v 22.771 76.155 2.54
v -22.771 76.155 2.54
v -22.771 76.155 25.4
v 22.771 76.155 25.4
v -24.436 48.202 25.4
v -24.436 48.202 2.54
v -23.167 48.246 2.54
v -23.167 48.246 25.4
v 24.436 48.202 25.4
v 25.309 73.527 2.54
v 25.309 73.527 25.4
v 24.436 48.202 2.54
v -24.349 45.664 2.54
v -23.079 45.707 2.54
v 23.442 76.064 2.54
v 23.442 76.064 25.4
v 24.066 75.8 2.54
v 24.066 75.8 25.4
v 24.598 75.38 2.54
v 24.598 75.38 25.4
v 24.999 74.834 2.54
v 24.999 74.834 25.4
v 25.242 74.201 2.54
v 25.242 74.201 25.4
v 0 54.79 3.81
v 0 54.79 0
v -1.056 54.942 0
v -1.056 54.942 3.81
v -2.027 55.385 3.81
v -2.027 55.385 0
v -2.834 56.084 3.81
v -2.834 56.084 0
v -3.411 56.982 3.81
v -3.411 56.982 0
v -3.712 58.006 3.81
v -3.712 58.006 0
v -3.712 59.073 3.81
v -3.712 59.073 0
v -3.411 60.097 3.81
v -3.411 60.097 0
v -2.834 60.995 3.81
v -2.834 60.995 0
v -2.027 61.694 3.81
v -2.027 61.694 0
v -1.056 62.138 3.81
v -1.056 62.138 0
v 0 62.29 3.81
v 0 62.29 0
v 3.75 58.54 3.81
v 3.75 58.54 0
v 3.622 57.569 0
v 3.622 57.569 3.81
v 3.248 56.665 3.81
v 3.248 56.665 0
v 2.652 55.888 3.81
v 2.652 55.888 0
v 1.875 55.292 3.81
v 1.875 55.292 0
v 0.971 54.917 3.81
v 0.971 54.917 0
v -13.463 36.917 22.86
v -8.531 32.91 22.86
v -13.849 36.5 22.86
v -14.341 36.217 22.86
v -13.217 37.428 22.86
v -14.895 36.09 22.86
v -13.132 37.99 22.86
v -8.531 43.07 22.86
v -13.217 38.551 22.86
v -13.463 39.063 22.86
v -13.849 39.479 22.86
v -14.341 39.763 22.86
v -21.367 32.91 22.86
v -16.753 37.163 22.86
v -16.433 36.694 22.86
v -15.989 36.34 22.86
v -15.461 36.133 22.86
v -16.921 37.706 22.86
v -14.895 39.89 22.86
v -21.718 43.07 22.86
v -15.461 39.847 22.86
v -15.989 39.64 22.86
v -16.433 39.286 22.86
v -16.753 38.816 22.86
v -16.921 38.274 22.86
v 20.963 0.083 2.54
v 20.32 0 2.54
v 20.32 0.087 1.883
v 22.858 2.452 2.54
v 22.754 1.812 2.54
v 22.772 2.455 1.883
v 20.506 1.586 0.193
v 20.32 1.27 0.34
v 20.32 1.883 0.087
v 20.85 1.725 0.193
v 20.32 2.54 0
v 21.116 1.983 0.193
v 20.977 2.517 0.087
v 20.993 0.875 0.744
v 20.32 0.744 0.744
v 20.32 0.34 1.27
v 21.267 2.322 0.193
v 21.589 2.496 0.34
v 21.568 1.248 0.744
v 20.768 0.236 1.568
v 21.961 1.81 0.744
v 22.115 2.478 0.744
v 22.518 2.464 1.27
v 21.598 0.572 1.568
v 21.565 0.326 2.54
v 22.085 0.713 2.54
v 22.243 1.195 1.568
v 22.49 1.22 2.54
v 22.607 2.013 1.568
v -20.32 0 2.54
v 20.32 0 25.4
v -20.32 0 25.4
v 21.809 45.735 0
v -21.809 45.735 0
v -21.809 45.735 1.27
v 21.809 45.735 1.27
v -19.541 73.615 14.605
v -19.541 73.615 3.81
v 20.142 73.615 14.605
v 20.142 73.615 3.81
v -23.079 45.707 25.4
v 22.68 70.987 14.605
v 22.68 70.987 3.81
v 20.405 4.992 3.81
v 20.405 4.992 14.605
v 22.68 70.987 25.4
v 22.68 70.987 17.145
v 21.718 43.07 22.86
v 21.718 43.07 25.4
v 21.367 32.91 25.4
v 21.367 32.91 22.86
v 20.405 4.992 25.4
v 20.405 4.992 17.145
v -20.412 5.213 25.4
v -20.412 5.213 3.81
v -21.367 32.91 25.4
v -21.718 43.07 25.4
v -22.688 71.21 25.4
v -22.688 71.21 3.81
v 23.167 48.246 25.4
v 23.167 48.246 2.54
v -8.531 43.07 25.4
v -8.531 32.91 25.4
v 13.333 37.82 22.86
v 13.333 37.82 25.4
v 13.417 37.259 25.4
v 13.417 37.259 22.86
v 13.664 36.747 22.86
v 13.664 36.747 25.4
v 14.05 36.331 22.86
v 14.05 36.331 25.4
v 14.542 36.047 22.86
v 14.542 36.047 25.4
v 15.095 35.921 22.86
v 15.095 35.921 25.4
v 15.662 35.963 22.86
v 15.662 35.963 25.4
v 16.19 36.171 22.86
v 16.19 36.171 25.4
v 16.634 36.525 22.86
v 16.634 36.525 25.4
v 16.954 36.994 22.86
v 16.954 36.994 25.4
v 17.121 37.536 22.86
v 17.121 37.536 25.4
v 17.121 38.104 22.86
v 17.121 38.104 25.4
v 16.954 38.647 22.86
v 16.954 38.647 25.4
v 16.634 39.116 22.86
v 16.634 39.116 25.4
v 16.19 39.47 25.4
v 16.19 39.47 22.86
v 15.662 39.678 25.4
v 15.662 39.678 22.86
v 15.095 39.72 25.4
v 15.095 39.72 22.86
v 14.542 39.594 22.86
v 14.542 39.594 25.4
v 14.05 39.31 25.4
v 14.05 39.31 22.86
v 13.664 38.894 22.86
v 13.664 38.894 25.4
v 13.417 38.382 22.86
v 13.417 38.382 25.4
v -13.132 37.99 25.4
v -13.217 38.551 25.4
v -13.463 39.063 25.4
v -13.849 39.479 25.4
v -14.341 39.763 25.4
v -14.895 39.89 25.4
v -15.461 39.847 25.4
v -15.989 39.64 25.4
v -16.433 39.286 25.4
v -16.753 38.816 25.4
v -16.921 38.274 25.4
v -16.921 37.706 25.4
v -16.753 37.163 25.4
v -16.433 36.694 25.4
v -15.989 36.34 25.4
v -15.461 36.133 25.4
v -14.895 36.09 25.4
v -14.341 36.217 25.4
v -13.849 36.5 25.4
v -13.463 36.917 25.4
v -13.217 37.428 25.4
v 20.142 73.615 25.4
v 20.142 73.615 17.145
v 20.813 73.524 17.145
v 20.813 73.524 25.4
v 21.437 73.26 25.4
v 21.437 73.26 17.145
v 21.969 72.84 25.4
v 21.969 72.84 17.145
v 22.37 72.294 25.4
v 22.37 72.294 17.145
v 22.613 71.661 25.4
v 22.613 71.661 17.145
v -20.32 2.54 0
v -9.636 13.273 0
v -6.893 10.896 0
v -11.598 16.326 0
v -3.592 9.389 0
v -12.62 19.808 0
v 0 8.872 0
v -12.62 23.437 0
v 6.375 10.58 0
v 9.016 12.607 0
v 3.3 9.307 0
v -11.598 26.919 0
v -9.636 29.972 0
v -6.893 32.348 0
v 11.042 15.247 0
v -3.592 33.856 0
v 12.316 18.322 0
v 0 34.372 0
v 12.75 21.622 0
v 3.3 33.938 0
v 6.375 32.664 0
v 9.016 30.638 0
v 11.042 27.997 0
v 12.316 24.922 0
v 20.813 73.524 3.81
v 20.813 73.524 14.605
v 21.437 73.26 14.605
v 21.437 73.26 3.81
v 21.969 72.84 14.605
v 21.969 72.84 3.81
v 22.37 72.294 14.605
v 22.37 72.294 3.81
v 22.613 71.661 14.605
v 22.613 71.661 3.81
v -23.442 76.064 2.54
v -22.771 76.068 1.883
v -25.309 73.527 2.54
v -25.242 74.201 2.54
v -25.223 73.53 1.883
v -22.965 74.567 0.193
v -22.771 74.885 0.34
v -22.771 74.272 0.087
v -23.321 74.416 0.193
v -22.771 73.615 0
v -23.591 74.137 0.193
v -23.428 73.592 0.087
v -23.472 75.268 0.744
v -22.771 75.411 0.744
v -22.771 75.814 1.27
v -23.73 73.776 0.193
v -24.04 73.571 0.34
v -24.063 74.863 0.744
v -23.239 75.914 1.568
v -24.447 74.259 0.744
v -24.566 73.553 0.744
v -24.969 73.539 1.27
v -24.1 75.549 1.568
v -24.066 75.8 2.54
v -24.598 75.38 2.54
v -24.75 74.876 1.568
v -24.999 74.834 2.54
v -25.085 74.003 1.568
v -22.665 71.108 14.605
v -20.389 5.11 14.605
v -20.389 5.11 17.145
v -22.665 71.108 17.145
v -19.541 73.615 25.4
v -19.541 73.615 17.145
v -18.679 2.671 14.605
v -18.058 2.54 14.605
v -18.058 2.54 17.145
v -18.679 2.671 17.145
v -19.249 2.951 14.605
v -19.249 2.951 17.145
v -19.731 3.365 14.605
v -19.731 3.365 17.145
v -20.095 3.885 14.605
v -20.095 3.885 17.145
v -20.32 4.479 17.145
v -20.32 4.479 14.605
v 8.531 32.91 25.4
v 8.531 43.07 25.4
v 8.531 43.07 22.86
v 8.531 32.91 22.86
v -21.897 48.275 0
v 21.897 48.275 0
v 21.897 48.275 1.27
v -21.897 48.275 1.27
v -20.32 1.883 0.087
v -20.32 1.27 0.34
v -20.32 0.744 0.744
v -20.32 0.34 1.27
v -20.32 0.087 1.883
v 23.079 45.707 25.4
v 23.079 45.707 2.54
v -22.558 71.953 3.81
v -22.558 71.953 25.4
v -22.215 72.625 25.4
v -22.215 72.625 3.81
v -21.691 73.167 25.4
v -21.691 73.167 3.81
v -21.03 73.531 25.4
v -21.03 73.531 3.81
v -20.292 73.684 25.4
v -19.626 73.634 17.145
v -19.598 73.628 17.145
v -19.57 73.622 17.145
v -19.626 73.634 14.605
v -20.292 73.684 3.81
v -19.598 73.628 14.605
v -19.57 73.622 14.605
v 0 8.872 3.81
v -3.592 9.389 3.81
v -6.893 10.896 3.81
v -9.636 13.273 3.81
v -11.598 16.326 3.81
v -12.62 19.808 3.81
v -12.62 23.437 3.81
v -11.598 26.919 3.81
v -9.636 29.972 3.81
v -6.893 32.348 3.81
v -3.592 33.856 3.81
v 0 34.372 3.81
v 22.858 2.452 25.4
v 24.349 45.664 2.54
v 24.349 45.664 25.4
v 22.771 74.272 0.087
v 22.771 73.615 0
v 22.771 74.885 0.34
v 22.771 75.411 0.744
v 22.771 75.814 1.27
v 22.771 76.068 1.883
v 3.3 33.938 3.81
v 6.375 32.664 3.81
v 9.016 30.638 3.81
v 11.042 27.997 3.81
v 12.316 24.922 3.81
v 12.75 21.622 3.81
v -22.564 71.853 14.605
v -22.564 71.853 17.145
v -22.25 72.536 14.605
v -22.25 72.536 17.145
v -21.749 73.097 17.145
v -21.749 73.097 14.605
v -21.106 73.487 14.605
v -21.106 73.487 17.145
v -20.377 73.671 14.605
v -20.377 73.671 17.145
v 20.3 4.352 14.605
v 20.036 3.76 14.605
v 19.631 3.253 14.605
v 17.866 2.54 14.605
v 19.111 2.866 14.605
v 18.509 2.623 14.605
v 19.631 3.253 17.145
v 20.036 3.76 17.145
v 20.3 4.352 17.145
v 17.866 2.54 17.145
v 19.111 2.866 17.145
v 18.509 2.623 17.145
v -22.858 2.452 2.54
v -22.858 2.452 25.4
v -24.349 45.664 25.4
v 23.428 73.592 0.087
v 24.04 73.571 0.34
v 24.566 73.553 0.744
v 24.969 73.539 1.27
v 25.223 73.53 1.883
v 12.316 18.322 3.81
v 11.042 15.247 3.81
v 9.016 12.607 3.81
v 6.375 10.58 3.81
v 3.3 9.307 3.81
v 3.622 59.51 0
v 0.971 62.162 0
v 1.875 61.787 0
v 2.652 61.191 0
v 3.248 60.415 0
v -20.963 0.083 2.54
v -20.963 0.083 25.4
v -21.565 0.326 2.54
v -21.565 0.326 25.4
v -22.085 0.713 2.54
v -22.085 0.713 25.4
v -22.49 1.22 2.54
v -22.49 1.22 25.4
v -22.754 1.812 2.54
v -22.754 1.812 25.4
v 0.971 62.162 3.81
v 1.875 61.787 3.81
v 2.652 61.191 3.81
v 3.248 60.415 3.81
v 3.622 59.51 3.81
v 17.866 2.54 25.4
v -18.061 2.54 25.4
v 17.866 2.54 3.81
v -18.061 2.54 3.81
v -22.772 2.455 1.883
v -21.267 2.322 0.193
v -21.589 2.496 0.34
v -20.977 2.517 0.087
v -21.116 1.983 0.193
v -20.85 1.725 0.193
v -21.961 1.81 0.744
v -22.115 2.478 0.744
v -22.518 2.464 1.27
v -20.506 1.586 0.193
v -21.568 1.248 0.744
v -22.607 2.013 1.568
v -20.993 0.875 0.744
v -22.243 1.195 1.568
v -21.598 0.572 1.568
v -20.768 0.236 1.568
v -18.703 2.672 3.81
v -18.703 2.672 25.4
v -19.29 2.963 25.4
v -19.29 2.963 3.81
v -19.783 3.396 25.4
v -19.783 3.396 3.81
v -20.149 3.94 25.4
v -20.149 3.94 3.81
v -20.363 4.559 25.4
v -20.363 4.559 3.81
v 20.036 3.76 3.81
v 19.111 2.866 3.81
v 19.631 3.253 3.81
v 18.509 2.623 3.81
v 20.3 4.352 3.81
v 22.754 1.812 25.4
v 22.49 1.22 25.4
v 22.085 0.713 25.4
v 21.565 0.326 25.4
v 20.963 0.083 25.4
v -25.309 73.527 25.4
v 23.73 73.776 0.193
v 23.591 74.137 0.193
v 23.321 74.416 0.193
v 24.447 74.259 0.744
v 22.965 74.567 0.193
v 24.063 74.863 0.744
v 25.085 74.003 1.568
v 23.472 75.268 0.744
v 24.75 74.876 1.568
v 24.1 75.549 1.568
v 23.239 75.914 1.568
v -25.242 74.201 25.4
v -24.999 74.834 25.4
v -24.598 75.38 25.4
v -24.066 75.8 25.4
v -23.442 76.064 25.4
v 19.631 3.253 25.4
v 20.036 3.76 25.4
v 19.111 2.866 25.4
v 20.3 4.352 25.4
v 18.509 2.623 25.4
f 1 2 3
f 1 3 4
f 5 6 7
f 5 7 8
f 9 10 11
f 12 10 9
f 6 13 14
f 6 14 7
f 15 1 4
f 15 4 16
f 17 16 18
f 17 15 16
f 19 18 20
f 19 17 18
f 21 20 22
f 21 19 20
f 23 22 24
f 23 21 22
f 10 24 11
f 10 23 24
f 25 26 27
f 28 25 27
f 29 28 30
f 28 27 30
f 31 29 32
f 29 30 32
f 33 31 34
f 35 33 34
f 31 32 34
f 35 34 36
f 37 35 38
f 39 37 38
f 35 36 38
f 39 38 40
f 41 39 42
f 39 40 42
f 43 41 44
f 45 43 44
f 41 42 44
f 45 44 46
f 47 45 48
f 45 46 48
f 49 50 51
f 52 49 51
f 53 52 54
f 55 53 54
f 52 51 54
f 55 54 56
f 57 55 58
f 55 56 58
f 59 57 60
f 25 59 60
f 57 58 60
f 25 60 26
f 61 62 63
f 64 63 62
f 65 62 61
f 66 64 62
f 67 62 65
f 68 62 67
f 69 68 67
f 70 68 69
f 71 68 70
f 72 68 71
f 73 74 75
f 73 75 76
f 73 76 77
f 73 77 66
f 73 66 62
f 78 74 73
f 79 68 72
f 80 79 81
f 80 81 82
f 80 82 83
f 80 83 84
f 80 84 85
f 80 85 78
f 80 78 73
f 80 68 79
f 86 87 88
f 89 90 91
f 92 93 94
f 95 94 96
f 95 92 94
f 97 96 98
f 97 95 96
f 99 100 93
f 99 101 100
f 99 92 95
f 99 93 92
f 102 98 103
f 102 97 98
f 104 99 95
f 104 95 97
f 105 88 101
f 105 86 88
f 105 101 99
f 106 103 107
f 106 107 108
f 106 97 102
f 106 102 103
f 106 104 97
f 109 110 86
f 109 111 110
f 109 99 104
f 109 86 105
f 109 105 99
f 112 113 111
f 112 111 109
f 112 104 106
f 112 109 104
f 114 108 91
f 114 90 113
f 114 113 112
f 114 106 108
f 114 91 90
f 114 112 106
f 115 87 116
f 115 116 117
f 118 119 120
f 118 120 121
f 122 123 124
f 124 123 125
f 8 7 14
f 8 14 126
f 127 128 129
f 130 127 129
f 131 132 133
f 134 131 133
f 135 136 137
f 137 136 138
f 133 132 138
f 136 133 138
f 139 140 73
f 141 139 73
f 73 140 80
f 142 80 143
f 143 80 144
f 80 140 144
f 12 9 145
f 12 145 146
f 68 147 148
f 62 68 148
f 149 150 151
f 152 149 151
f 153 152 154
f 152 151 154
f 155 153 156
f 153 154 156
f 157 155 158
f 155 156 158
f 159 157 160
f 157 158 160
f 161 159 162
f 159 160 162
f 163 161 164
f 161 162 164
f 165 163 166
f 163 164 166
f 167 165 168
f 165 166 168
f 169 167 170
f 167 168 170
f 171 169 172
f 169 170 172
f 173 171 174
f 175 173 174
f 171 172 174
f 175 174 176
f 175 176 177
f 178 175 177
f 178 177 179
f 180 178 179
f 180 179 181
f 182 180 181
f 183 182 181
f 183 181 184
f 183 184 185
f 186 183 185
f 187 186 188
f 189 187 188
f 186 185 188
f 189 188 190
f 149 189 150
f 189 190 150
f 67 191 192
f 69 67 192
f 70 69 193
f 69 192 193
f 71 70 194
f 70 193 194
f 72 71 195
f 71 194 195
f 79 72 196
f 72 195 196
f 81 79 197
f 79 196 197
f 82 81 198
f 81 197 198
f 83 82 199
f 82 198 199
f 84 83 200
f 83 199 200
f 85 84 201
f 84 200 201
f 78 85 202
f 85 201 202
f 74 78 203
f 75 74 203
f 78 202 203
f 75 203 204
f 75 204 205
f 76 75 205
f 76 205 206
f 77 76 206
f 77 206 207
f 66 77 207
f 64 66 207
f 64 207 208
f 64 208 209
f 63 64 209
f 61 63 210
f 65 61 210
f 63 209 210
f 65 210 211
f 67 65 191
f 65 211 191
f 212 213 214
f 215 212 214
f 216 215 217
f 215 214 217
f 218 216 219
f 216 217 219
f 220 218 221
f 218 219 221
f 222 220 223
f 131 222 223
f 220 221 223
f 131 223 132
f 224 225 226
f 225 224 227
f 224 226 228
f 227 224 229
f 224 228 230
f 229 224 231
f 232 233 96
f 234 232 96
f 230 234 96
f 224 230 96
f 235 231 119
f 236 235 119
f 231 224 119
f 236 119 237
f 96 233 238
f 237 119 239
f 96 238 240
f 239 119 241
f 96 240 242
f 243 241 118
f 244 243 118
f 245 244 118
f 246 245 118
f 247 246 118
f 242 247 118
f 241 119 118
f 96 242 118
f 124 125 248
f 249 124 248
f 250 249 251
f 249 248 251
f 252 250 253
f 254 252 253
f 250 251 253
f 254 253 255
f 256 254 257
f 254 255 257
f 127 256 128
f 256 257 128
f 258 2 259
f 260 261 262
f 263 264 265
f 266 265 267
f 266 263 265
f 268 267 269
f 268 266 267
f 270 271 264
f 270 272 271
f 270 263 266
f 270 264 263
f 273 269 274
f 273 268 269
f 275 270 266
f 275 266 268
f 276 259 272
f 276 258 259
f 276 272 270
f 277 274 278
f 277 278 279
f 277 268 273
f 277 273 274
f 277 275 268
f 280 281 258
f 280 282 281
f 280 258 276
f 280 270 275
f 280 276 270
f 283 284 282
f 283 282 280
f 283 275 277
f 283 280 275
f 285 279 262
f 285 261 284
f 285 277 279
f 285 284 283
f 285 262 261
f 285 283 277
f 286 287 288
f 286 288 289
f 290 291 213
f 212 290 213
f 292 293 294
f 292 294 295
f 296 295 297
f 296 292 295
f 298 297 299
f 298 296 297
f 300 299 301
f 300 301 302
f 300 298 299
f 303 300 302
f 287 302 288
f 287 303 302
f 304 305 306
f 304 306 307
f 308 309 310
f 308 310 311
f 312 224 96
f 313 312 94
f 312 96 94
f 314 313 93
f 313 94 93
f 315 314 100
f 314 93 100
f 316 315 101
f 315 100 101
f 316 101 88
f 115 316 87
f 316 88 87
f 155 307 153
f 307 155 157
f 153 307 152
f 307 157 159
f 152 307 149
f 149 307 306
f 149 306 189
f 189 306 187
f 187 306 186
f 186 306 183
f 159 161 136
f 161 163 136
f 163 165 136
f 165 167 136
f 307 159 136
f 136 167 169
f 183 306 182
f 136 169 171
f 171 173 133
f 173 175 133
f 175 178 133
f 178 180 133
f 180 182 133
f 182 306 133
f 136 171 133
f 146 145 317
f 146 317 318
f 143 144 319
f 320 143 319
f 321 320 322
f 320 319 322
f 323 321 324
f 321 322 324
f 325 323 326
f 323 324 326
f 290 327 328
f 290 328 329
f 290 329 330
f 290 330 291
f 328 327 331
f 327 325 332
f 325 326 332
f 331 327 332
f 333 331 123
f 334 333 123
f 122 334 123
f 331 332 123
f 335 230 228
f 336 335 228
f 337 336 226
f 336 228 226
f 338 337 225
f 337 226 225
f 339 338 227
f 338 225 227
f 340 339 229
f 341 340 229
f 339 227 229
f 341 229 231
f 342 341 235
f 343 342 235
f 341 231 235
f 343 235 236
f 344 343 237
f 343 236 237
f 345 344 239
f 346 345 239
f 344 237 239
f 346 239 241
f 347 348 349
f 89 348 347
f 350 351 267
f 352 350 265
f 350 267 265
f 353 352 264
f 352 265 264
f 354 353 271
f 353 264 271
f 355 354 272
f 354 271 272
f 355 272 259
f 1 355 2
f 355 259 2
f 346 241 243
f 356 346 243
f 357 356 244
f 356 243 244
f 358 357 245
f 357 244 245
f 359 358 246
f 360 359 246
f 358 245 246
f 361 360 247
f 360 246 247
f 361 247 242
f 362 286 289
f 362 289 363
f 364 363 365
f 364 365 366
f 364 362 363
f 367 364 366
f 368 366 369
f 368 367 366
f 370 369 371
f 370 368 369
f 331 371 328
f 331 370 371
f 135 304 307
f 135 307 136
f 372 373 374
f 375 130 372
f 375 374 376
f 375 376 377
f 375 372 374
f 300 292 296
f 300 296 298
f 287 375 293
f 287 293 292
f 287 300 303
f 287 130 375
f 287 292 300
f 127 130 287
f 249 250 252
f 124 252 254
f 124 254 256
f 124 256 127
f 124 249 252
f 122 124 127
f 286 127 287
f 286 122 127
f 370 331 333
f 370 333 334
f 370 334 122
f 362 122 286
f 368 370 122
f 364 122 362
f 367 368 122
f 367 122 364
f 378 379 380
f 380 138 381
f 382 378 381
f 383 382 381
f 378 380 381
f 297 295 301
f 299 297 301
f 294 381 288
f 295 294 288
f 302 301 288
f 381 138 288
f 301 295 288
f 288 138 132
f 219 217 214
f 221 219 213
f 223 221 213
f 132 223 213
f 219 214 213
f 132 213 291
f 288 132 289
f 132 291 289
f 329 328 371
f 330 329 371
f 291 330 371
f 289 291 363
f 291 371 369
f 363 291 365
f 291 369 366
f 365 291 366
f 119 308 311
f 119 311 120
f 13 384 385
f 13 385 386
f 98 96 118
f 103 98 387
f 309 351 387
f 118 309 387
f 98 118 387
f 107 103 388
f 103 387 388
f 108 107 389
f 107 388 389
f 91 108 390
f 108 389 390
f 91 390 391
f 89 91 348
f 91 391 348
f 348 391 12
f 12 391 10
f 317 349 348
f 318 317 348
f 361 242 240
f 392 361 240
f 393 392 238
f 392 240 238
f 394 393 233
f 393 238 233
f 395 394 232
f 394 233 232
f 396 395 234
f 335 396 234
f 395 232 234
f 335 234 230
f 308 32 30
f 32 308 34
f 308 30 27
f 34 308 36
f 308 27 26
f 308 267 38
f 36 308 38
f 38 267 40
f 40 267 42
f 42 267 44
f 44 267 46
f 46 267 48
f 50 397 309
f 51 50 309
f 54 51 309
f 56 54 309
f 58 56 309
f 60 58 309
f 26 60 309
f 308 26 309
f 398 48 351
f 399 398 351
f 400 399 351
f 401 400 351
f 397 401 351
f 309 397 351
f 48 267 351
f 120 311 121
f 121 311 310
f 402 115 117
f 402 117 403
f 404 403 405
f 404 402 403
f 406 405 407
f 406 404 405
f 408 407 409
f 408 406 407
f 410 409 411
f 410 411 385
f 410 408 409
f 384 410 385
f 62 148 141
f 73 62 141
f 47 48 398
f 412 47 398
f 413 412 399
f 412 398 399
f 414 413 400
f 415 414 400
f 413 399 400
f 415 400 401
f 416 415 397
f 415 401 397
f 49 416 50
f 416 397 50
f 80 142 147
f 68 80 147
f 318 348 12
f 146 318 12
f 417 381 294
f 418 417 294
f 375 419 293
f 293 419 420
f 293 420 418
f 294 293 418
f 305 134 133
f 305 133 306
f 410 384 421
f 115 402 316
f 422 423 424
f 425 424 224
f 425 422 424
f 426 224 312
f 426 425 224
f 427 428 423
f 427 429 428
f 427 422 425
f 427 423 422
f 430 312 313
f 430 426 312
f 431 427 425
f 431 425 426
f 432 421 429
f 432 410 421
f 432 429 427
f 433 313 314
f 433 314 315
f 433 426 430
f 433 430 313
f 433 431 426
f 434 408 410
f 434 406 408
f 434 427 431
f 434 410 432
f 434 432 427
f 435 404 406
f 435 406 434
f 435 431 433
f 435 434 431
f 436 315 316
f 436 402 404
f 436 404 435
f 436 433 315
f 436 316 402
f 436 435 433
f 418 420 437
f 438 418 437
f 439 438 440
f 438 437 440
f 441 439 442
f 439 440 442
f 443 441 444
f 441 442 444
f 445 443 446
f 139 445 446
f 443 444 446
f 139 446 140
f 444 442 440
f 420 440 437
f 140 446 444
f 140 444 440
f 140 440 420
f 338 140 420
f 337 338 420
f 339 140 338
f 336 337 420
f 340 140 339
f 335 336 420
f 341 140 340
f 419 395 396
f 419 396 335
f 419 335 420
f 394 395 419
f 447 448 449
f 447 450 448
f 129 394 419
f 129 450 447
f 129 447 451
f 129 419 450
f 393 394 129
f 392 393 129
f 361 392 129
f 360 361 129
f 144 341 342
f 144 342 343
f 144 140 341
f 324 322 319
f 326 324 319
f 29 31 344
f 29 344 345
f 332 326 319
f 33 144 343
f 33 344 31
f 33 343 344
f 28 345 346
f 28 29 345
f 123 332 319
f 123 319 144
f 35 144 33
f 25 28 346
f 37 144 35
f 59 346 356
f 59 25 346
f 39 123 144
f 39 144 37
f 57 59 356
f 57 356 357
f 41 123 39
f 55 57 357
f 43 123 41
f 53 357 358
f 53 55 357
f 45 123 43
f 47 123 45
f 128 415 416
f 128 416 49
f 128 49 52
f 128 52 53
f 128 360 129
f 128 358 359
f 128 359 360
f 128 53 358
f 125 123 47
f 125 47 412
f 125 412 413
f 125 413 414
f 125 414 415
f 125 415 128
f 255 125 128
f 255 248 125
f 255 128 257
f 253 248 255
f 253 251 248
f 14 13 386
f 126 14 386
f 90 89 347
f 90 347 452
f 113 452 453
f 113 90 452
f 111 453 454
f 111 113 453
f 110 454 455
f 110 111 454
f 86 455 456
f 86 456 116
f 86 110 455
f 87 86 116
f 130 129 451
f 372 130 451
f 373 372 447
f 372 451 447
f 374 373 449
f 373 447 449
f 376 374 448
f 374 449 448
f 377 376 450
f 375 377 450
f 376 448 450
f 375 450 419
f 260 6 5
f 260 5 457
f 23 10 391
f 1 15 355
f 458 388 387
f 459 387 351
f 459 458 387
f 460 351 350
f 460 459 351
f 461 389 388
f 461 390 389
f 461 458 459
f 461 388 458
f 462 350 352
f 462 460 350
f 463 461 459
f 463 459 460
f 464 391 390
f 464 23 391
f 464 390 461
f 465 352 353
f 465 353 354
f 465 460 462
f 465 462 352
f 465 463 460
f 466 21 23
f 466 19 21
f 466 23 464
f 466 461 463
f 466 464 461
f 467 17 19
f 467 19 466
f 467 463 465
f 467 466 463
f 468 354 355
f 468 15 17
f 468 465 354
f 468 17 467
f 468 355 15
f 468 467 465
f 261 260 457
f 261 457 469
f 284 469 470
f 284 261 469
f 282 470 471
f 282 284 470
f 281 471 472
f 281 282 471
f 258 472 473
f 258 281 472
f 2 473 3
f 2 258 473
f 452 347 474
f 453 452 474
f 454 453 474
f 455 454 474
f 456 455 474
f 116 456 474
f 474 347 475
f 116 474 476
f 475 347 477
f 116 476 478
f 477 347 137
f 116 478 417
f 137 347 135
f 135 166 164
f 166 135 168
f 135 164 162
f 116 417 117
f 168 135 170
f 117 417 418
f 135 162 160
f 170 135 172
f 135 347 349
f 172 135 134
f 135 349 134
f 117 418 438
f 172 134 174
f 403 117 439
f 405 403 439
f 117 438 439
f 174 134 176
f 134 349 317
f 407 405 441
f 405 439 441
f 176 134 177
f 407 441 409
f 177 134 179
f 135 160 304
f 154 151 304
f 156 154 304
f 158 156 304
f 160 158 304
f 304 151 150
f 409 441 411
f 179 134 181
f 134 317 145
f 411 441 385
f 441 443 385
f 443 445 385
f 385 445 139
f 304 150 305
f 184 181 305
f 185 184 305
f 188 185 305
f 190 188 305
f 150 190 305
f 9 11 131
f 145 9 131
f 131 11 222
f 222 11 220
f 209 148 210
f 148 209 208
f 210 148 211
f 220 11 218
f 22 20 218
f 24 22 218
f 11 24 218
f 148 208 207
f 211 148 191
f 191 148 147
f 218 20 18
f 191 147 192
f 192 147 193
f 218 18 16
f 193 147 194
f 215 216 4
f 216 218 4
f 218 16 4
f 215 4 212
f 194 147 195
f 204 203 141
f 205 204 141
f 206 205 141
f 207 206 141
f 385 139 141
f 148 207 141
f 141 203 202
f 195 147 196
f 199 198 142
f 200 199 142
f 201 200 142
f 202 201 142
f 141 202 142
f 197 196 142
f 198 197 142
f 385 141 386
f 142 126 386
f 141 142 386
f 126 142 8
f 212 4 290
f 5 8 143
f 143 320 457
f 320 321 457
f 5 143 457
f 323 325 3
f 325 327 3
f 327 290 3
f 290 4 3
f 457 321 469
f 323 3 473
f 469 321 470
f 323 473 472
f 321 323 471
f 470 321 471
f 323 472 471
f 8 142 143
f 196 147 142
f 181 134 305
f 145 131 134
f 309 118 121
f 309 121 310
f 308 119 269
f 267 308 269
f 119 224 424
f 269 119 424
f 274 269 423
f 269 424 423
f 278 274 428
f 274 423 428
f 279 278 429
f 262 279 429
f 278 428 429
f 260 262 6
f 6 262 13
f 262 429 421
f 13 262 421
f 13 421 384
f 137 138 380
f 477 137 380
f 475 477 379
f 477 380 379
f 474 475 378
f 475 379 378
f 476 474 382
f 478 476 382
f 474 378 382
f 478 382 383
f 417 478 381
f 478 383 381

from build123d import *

# Parameters (mm, degrees)
BOSS_EXTRUDE1_DEPTH = 3.81
BOSS_EXTRUDE3_DEPTH = 21.59
BOSS_EXTRUDE4_DEPTH = 2.54
FILLET1_R           = 2.54
BOSS_EXTRUDE6_DEPTH = 2.54
SKETCH9_R           = 1.905
CUT_EXTRUDE1_DEPTH  = 2.54
CUT_EXTRUDE2_DEPTH  = 1.27
SKETCH11_W          = 22.86
SKETCH11_H          = 2.54
CUT_EXTRUDE3_DEPTH  = 1.27
SKETCH12_W          = 22.86
SKETCH12_H          = 2.54
CUT_EXTRUDE4_DEPTH  = 1.27


with BuildPart() as part:
    # Sketch1 → Boss-Extrude1 (new body)
    with BuildSketch(Plane.XY):
        with BuildLine():
            Line((0, 62.289610149), (0, 73.614735329))
            Line((0, 73.614735329), (-19.541270744, 73.614735329))
            ThreePointArc((-19.541270744, 73.614735329), (-21.690891162, 73.166710129), (-22.687990425, 71.210339105))
            Line((-22.687990425, 71.210339105), (-20.412160003, 5.212586245))
            ThreePointArc((-20.412160003, 5.212586245), (-19.78310781, 3.39559701), (-18.061159176, 2.539998129))
            Line((-18.061159176, 2.539998129), (0, 2.539998129))
            Line((0, 2.539998129), (0, 8.872308918))
            ThreePointArc((0, 8.872308918), (-12.75, 21.622308918), (0, 34.372308918))
            Line((0, 34.372308918), (0, 54.789610149))
            ThreePointArc((0, 54.789610149), (-3.75, 58.539610149), (0, 62.289610149))
        make_face()
        with BuildLine():
            Line((20.141804619, 73.614735329), (0, 73.614735329))
            Line((0, 73.614735329), (0, 62.289610149))
            ThreePointArc((0, 62.289610149), (2.651650429, 61.191260578), (3.75, 58.539610149))
            ThreePointArc((3.75, 58.539610149), (2.651650429, 55.887959719), (0, 54.789610149))
            Line((0, 54.789610149), (0, 34.372308918))
            ThreePointArc((0, 34.372308918), (9.01561146, 30.637920378), (12.75, 21.622308918))
            ThreePointArc((12.75, 21.622308918), (9.01561146, 12.606697458), (0, 8.872308918))
            Line((0, 8.872308918), (0, 2.539998129))
            Line((0, 2.539998129), (17.866078187, 2.539998129))
            ThreePointArc((17.866078187, 2.539998129), (19.630909441, 3.253260423), (20.404569365, 4.992462187))
            Line((20.404569365, 4.992462187), (22.680295797, 70.987199387))
            ThreePointArc((22.680295797, 70.987199387), (21.968542325, 72.839566583), (20.141804619, 73.614735329))
        make_face()
        with BuildLine():
            Line((0, 76.154735329), (-22.77090231, 76.154735329))
            ThreePointArc((-22.77090231, 76.154735329), (-24.597640016, 75.379566583), (-25.309393487, 73.527199387))
            Line((-25.309393487, 73.527199387), (-22.858491178, 2.452464058))
            ThreePointArc((-22.858491178, 2.452464058), (-22.084831254, 0.713262294), (-20.32, 0))
            Line((-20.32, 0), (0, 0))
            Line((0, 0), (0, 2.539998129))
            Line((0, 2.539998129), (-18.061159176, 2.539998129))
            ThreePointArc((-18.061159176, 2.539998129), (-19.78310781, 3.39559701), (-20.412160003, 5.212586245))
            Line((-20.412160003, 5.212586245), (-22.687990425, 71.210339105))
            ThreePointArc((-22.687990425, 71.210339105), (-21.690891162, 73.166710129), (-19.541270744, 73.614735329))
            Line((-19.541270744, 73.614735329), (0, 73.614735329))
            Line((0, 73.614735329), (0, 76.154735329))
        make_face()
        with BuildLine():
            Line((22.77090231, 76.154735329), (0, 76.154735329))
            Line((0, 76.154735329), (0, 73.614735329))
            Line((0, 73.614735329), (20.141804619, 73.614735329))
            ThreePointArc((20.141804619, 73.614735329), (21.968542325, 72.839566583), (22.680295797, 70.987199387))
            Line((22.680295797, 70.987199387), (20.404569365, 4.992462187))
            ThreePointArc((20.404569365, 4.992462187), (19.630909441, 3.253260423), (17.866078187, 2.539998129))
            Line((17.866078187, 2.539998129), (0, 2.539998129))
            Line((0, 2.539998129), (0, 0))
            Line((0, 0), (20.32, 0))
            ThreePointArc((20.32, 0), (22.084831254, 0.713262294), (22.858491178, 2.452464058))
            Line((22.858491178, 2.452464058), (25.309393487, 73.527199387))
            ThreePointArc((25.309393487, 73.527199387), (24.597640016, 75.379566583), (22.77090231, 76.154735329))
        make_face()
    extrude(amount=BOSS_EXTRUDE1_DEPTH)

    # Sketch4 → Boss-Extrude3 (add)
    with BuildSketch(Plane.XY.offset(3.81)):
        with BuildLine():
            Line((-22.77090231, 76.154735329), (22.77090231, 76.154735329))
            ThreePointArc((22.77090231, 76.154735329), (24.597640016, 75.379566583), (25.309393487, 73.527199387))
            Line((25.309393487, 73.527199387), (22.858491178, 2.452464058))
            ThreePointArc((22.858491178, 2.452464058), (22.084831254, 0.713262294), (20.32, 0))
            Line((20.32, 0), (-20.32, 0))
            ThreePointArc((-20.32, 0), (-22.084831254, 0.713262294), (-22.858491178, 2.452464058))
            Line((-22.858491178, 2.452464058), (-25.309393487, 73.527199387))
            ThreePointArc((-25.309393487, 73.527199387), (-24.597640016, 75.379566583), (-22.77090231, 76.154735329))
        make_face()
        with BuildLine():
            Line((-19.541270744, 73.614735329), (20.141804619, 73.614735329))
            ThreePointArc((20.141804619, 73.614735329), (21.968542325, 72.839566583), (22.680295797, 70.987199387))
            Line((22.680295797, 70.987199387), (20.404569365, 4.992462187))
            ThreePointArc((20.404569365, 4.992462187), (19.630909441, 3.253260423), (17.866078187, 2.539998129))
            Line((17.866078187, 2.539998129), (-18.061159176, 2.539998129))
            ThreePointArc((-18.061159176, 2.539998129), (-19.78310781, 3.39559701), (-20.412160003, 5.212586245))
            Line((-20.412160003, 5.212586245), (-22.687990425, 71.210339105))
            ThreePointArc((-22.687990425, 71.210339105), (-21.690891162, 73.166710129), (-19.541270744, 73.614735329))
        make_face(mode=Mode.SUBTRACT)
    extrude(amount=BOSS_EXTRUDE3_DEPTH)

    # Sketch7 → Boss-Extrude4 (add)
    with BuildSketch(Plane.XY.offset(14.605)):
        with BuildLine():
            Line((-19.537731311, 73.614735329), (20.145344052, 73.614735329))
            ThreePointArc((20.145344052, 73.614735329), (21.972081758, 72.839566583), (22.68383523, 70.987199387))
            Line((22.68383523, 70.987199387), (20.408108798, 4.992462187))
            ThreePointArc((20.408108798, 4.992462187), (19.634448874, 3.253260423), (17.86961762, 2.539998129))
            Line((17.86961762, 2.539998129), (-18.057619743, 2.539998129))
            ThreePointArc((-18.057619743, 2.539998129), (-19.730779532, 3.364707915), (-20.389382819, 5.109944754))
            Line((-20.389382819, 5.109944754), (-22.665213241, 71.107697614))
            ThreePointArc((-22.665213241, 71.107697614), (-21.714144758, 73.125513756), (-19.537731311, 73.614735329))
        make_face()
    extrude(amount=BOSS_EXTRUDE4_DEPTH)

    # Fillet1
    fillet1_edges = [part.edges().sort_by_distance(p)[0] for p in [
        (-22.084831254, 0.713262294, 0),
        (-24.083942332, 37.989831723, 0),
        (-24.597640016, 75.379566583, 0),
        (0, 76.154735329, 0),
        (24.597640016, 75.379566583, 0),
        (24.083942332, 37.989831723, 0),
        (22.084831254, 0.713262294, 0),
        (0, 0, 0),
    ]]
    fillet(fillet1_edges, radius=FILLET1_R)

    # Sketch8 → Boss-Extrude6 (add)
    with BuildSketch(Plane.XY.offset(25.4)):
        Polygon((-21.717608556, 43.069831723), (-8.531459132, 43.069831723), (-8.531459132, 32.909831723), (-21.367256671, 32.909831723), align=None)
        Polygon((8.531459132, 32.909831723), (21.367256671, 32.909831723), (21.717608556, 43.069831723), (8.531459132, 43.069831723), align=None)
    extrude(amount=-BOSS_EXTRUDE6_DEPTH)

    # Sketch9 → Cut-Extrude1 (cut)
    with BuildSketch(Plane.XY.offset(25.4)):
        with Locations((-15.036945873, 37.989831723)):
            Circle(SKETCH9_R)
        with Locations(Location((15.237744036, 37.820383377, 0), (0, 0, 180))):
            Circle(SKETCH9_R)
    extrude(amount=-CUT_EXTRUDE1_DEPTH, mode=Mode.SUBTRACT)

    # Sketch10 → Cut-Extrude2 (cut)
    with BuildSketch(Plane(origin=(0, 0, 0), x_dir=(-1, 0, 0), z_dir=(0, 0, -1))):
        Polygon((-21.897084176, 48.274519863), (21.897084176, 48.274519863), (21.809496204, 45.734519863), (-21.809496204, 45.734519863), align=None)
    extrude(amount=-CUT_EXTRUDE2_DEPTH, mode=Mode.SUBTRACT)

    # Sketch11 → Cut-Extrude3 (cut)
    with BuildSketch(Plane(origin=(-22.746873247, -0.784390739, 0), x_dir=(0, 0, 1), z_dir=(-0.9994059754448638, -0.03446296918579016, 0))):
        with Locations((13.97, 47.745550873)):
            Rectangle(SKETCH11_W, SKETCH11_H)
    extrude(amount=-CUT_EXTRUDE3_DEPTH, mode=Mode.SUBTRACT)

    # Sketch12 → Cut-Extrude4 (cut)
    with BuildSketch(Plane(origin=(22.746873247, -0.784390739, 0), x_dir=(0, 0, -1), z_dir=(0.9994059754448638, -0.034462969185789866, 0))):
        with Locations((-13.97, 47.745550873)):
            Rectangle(SKETCH12_W, SKETCH12_H)
    extrude(amount=-CUT_EXTRUDE4_DEPTH, mode=Mode.SUBTRACT)


solid = part.part
